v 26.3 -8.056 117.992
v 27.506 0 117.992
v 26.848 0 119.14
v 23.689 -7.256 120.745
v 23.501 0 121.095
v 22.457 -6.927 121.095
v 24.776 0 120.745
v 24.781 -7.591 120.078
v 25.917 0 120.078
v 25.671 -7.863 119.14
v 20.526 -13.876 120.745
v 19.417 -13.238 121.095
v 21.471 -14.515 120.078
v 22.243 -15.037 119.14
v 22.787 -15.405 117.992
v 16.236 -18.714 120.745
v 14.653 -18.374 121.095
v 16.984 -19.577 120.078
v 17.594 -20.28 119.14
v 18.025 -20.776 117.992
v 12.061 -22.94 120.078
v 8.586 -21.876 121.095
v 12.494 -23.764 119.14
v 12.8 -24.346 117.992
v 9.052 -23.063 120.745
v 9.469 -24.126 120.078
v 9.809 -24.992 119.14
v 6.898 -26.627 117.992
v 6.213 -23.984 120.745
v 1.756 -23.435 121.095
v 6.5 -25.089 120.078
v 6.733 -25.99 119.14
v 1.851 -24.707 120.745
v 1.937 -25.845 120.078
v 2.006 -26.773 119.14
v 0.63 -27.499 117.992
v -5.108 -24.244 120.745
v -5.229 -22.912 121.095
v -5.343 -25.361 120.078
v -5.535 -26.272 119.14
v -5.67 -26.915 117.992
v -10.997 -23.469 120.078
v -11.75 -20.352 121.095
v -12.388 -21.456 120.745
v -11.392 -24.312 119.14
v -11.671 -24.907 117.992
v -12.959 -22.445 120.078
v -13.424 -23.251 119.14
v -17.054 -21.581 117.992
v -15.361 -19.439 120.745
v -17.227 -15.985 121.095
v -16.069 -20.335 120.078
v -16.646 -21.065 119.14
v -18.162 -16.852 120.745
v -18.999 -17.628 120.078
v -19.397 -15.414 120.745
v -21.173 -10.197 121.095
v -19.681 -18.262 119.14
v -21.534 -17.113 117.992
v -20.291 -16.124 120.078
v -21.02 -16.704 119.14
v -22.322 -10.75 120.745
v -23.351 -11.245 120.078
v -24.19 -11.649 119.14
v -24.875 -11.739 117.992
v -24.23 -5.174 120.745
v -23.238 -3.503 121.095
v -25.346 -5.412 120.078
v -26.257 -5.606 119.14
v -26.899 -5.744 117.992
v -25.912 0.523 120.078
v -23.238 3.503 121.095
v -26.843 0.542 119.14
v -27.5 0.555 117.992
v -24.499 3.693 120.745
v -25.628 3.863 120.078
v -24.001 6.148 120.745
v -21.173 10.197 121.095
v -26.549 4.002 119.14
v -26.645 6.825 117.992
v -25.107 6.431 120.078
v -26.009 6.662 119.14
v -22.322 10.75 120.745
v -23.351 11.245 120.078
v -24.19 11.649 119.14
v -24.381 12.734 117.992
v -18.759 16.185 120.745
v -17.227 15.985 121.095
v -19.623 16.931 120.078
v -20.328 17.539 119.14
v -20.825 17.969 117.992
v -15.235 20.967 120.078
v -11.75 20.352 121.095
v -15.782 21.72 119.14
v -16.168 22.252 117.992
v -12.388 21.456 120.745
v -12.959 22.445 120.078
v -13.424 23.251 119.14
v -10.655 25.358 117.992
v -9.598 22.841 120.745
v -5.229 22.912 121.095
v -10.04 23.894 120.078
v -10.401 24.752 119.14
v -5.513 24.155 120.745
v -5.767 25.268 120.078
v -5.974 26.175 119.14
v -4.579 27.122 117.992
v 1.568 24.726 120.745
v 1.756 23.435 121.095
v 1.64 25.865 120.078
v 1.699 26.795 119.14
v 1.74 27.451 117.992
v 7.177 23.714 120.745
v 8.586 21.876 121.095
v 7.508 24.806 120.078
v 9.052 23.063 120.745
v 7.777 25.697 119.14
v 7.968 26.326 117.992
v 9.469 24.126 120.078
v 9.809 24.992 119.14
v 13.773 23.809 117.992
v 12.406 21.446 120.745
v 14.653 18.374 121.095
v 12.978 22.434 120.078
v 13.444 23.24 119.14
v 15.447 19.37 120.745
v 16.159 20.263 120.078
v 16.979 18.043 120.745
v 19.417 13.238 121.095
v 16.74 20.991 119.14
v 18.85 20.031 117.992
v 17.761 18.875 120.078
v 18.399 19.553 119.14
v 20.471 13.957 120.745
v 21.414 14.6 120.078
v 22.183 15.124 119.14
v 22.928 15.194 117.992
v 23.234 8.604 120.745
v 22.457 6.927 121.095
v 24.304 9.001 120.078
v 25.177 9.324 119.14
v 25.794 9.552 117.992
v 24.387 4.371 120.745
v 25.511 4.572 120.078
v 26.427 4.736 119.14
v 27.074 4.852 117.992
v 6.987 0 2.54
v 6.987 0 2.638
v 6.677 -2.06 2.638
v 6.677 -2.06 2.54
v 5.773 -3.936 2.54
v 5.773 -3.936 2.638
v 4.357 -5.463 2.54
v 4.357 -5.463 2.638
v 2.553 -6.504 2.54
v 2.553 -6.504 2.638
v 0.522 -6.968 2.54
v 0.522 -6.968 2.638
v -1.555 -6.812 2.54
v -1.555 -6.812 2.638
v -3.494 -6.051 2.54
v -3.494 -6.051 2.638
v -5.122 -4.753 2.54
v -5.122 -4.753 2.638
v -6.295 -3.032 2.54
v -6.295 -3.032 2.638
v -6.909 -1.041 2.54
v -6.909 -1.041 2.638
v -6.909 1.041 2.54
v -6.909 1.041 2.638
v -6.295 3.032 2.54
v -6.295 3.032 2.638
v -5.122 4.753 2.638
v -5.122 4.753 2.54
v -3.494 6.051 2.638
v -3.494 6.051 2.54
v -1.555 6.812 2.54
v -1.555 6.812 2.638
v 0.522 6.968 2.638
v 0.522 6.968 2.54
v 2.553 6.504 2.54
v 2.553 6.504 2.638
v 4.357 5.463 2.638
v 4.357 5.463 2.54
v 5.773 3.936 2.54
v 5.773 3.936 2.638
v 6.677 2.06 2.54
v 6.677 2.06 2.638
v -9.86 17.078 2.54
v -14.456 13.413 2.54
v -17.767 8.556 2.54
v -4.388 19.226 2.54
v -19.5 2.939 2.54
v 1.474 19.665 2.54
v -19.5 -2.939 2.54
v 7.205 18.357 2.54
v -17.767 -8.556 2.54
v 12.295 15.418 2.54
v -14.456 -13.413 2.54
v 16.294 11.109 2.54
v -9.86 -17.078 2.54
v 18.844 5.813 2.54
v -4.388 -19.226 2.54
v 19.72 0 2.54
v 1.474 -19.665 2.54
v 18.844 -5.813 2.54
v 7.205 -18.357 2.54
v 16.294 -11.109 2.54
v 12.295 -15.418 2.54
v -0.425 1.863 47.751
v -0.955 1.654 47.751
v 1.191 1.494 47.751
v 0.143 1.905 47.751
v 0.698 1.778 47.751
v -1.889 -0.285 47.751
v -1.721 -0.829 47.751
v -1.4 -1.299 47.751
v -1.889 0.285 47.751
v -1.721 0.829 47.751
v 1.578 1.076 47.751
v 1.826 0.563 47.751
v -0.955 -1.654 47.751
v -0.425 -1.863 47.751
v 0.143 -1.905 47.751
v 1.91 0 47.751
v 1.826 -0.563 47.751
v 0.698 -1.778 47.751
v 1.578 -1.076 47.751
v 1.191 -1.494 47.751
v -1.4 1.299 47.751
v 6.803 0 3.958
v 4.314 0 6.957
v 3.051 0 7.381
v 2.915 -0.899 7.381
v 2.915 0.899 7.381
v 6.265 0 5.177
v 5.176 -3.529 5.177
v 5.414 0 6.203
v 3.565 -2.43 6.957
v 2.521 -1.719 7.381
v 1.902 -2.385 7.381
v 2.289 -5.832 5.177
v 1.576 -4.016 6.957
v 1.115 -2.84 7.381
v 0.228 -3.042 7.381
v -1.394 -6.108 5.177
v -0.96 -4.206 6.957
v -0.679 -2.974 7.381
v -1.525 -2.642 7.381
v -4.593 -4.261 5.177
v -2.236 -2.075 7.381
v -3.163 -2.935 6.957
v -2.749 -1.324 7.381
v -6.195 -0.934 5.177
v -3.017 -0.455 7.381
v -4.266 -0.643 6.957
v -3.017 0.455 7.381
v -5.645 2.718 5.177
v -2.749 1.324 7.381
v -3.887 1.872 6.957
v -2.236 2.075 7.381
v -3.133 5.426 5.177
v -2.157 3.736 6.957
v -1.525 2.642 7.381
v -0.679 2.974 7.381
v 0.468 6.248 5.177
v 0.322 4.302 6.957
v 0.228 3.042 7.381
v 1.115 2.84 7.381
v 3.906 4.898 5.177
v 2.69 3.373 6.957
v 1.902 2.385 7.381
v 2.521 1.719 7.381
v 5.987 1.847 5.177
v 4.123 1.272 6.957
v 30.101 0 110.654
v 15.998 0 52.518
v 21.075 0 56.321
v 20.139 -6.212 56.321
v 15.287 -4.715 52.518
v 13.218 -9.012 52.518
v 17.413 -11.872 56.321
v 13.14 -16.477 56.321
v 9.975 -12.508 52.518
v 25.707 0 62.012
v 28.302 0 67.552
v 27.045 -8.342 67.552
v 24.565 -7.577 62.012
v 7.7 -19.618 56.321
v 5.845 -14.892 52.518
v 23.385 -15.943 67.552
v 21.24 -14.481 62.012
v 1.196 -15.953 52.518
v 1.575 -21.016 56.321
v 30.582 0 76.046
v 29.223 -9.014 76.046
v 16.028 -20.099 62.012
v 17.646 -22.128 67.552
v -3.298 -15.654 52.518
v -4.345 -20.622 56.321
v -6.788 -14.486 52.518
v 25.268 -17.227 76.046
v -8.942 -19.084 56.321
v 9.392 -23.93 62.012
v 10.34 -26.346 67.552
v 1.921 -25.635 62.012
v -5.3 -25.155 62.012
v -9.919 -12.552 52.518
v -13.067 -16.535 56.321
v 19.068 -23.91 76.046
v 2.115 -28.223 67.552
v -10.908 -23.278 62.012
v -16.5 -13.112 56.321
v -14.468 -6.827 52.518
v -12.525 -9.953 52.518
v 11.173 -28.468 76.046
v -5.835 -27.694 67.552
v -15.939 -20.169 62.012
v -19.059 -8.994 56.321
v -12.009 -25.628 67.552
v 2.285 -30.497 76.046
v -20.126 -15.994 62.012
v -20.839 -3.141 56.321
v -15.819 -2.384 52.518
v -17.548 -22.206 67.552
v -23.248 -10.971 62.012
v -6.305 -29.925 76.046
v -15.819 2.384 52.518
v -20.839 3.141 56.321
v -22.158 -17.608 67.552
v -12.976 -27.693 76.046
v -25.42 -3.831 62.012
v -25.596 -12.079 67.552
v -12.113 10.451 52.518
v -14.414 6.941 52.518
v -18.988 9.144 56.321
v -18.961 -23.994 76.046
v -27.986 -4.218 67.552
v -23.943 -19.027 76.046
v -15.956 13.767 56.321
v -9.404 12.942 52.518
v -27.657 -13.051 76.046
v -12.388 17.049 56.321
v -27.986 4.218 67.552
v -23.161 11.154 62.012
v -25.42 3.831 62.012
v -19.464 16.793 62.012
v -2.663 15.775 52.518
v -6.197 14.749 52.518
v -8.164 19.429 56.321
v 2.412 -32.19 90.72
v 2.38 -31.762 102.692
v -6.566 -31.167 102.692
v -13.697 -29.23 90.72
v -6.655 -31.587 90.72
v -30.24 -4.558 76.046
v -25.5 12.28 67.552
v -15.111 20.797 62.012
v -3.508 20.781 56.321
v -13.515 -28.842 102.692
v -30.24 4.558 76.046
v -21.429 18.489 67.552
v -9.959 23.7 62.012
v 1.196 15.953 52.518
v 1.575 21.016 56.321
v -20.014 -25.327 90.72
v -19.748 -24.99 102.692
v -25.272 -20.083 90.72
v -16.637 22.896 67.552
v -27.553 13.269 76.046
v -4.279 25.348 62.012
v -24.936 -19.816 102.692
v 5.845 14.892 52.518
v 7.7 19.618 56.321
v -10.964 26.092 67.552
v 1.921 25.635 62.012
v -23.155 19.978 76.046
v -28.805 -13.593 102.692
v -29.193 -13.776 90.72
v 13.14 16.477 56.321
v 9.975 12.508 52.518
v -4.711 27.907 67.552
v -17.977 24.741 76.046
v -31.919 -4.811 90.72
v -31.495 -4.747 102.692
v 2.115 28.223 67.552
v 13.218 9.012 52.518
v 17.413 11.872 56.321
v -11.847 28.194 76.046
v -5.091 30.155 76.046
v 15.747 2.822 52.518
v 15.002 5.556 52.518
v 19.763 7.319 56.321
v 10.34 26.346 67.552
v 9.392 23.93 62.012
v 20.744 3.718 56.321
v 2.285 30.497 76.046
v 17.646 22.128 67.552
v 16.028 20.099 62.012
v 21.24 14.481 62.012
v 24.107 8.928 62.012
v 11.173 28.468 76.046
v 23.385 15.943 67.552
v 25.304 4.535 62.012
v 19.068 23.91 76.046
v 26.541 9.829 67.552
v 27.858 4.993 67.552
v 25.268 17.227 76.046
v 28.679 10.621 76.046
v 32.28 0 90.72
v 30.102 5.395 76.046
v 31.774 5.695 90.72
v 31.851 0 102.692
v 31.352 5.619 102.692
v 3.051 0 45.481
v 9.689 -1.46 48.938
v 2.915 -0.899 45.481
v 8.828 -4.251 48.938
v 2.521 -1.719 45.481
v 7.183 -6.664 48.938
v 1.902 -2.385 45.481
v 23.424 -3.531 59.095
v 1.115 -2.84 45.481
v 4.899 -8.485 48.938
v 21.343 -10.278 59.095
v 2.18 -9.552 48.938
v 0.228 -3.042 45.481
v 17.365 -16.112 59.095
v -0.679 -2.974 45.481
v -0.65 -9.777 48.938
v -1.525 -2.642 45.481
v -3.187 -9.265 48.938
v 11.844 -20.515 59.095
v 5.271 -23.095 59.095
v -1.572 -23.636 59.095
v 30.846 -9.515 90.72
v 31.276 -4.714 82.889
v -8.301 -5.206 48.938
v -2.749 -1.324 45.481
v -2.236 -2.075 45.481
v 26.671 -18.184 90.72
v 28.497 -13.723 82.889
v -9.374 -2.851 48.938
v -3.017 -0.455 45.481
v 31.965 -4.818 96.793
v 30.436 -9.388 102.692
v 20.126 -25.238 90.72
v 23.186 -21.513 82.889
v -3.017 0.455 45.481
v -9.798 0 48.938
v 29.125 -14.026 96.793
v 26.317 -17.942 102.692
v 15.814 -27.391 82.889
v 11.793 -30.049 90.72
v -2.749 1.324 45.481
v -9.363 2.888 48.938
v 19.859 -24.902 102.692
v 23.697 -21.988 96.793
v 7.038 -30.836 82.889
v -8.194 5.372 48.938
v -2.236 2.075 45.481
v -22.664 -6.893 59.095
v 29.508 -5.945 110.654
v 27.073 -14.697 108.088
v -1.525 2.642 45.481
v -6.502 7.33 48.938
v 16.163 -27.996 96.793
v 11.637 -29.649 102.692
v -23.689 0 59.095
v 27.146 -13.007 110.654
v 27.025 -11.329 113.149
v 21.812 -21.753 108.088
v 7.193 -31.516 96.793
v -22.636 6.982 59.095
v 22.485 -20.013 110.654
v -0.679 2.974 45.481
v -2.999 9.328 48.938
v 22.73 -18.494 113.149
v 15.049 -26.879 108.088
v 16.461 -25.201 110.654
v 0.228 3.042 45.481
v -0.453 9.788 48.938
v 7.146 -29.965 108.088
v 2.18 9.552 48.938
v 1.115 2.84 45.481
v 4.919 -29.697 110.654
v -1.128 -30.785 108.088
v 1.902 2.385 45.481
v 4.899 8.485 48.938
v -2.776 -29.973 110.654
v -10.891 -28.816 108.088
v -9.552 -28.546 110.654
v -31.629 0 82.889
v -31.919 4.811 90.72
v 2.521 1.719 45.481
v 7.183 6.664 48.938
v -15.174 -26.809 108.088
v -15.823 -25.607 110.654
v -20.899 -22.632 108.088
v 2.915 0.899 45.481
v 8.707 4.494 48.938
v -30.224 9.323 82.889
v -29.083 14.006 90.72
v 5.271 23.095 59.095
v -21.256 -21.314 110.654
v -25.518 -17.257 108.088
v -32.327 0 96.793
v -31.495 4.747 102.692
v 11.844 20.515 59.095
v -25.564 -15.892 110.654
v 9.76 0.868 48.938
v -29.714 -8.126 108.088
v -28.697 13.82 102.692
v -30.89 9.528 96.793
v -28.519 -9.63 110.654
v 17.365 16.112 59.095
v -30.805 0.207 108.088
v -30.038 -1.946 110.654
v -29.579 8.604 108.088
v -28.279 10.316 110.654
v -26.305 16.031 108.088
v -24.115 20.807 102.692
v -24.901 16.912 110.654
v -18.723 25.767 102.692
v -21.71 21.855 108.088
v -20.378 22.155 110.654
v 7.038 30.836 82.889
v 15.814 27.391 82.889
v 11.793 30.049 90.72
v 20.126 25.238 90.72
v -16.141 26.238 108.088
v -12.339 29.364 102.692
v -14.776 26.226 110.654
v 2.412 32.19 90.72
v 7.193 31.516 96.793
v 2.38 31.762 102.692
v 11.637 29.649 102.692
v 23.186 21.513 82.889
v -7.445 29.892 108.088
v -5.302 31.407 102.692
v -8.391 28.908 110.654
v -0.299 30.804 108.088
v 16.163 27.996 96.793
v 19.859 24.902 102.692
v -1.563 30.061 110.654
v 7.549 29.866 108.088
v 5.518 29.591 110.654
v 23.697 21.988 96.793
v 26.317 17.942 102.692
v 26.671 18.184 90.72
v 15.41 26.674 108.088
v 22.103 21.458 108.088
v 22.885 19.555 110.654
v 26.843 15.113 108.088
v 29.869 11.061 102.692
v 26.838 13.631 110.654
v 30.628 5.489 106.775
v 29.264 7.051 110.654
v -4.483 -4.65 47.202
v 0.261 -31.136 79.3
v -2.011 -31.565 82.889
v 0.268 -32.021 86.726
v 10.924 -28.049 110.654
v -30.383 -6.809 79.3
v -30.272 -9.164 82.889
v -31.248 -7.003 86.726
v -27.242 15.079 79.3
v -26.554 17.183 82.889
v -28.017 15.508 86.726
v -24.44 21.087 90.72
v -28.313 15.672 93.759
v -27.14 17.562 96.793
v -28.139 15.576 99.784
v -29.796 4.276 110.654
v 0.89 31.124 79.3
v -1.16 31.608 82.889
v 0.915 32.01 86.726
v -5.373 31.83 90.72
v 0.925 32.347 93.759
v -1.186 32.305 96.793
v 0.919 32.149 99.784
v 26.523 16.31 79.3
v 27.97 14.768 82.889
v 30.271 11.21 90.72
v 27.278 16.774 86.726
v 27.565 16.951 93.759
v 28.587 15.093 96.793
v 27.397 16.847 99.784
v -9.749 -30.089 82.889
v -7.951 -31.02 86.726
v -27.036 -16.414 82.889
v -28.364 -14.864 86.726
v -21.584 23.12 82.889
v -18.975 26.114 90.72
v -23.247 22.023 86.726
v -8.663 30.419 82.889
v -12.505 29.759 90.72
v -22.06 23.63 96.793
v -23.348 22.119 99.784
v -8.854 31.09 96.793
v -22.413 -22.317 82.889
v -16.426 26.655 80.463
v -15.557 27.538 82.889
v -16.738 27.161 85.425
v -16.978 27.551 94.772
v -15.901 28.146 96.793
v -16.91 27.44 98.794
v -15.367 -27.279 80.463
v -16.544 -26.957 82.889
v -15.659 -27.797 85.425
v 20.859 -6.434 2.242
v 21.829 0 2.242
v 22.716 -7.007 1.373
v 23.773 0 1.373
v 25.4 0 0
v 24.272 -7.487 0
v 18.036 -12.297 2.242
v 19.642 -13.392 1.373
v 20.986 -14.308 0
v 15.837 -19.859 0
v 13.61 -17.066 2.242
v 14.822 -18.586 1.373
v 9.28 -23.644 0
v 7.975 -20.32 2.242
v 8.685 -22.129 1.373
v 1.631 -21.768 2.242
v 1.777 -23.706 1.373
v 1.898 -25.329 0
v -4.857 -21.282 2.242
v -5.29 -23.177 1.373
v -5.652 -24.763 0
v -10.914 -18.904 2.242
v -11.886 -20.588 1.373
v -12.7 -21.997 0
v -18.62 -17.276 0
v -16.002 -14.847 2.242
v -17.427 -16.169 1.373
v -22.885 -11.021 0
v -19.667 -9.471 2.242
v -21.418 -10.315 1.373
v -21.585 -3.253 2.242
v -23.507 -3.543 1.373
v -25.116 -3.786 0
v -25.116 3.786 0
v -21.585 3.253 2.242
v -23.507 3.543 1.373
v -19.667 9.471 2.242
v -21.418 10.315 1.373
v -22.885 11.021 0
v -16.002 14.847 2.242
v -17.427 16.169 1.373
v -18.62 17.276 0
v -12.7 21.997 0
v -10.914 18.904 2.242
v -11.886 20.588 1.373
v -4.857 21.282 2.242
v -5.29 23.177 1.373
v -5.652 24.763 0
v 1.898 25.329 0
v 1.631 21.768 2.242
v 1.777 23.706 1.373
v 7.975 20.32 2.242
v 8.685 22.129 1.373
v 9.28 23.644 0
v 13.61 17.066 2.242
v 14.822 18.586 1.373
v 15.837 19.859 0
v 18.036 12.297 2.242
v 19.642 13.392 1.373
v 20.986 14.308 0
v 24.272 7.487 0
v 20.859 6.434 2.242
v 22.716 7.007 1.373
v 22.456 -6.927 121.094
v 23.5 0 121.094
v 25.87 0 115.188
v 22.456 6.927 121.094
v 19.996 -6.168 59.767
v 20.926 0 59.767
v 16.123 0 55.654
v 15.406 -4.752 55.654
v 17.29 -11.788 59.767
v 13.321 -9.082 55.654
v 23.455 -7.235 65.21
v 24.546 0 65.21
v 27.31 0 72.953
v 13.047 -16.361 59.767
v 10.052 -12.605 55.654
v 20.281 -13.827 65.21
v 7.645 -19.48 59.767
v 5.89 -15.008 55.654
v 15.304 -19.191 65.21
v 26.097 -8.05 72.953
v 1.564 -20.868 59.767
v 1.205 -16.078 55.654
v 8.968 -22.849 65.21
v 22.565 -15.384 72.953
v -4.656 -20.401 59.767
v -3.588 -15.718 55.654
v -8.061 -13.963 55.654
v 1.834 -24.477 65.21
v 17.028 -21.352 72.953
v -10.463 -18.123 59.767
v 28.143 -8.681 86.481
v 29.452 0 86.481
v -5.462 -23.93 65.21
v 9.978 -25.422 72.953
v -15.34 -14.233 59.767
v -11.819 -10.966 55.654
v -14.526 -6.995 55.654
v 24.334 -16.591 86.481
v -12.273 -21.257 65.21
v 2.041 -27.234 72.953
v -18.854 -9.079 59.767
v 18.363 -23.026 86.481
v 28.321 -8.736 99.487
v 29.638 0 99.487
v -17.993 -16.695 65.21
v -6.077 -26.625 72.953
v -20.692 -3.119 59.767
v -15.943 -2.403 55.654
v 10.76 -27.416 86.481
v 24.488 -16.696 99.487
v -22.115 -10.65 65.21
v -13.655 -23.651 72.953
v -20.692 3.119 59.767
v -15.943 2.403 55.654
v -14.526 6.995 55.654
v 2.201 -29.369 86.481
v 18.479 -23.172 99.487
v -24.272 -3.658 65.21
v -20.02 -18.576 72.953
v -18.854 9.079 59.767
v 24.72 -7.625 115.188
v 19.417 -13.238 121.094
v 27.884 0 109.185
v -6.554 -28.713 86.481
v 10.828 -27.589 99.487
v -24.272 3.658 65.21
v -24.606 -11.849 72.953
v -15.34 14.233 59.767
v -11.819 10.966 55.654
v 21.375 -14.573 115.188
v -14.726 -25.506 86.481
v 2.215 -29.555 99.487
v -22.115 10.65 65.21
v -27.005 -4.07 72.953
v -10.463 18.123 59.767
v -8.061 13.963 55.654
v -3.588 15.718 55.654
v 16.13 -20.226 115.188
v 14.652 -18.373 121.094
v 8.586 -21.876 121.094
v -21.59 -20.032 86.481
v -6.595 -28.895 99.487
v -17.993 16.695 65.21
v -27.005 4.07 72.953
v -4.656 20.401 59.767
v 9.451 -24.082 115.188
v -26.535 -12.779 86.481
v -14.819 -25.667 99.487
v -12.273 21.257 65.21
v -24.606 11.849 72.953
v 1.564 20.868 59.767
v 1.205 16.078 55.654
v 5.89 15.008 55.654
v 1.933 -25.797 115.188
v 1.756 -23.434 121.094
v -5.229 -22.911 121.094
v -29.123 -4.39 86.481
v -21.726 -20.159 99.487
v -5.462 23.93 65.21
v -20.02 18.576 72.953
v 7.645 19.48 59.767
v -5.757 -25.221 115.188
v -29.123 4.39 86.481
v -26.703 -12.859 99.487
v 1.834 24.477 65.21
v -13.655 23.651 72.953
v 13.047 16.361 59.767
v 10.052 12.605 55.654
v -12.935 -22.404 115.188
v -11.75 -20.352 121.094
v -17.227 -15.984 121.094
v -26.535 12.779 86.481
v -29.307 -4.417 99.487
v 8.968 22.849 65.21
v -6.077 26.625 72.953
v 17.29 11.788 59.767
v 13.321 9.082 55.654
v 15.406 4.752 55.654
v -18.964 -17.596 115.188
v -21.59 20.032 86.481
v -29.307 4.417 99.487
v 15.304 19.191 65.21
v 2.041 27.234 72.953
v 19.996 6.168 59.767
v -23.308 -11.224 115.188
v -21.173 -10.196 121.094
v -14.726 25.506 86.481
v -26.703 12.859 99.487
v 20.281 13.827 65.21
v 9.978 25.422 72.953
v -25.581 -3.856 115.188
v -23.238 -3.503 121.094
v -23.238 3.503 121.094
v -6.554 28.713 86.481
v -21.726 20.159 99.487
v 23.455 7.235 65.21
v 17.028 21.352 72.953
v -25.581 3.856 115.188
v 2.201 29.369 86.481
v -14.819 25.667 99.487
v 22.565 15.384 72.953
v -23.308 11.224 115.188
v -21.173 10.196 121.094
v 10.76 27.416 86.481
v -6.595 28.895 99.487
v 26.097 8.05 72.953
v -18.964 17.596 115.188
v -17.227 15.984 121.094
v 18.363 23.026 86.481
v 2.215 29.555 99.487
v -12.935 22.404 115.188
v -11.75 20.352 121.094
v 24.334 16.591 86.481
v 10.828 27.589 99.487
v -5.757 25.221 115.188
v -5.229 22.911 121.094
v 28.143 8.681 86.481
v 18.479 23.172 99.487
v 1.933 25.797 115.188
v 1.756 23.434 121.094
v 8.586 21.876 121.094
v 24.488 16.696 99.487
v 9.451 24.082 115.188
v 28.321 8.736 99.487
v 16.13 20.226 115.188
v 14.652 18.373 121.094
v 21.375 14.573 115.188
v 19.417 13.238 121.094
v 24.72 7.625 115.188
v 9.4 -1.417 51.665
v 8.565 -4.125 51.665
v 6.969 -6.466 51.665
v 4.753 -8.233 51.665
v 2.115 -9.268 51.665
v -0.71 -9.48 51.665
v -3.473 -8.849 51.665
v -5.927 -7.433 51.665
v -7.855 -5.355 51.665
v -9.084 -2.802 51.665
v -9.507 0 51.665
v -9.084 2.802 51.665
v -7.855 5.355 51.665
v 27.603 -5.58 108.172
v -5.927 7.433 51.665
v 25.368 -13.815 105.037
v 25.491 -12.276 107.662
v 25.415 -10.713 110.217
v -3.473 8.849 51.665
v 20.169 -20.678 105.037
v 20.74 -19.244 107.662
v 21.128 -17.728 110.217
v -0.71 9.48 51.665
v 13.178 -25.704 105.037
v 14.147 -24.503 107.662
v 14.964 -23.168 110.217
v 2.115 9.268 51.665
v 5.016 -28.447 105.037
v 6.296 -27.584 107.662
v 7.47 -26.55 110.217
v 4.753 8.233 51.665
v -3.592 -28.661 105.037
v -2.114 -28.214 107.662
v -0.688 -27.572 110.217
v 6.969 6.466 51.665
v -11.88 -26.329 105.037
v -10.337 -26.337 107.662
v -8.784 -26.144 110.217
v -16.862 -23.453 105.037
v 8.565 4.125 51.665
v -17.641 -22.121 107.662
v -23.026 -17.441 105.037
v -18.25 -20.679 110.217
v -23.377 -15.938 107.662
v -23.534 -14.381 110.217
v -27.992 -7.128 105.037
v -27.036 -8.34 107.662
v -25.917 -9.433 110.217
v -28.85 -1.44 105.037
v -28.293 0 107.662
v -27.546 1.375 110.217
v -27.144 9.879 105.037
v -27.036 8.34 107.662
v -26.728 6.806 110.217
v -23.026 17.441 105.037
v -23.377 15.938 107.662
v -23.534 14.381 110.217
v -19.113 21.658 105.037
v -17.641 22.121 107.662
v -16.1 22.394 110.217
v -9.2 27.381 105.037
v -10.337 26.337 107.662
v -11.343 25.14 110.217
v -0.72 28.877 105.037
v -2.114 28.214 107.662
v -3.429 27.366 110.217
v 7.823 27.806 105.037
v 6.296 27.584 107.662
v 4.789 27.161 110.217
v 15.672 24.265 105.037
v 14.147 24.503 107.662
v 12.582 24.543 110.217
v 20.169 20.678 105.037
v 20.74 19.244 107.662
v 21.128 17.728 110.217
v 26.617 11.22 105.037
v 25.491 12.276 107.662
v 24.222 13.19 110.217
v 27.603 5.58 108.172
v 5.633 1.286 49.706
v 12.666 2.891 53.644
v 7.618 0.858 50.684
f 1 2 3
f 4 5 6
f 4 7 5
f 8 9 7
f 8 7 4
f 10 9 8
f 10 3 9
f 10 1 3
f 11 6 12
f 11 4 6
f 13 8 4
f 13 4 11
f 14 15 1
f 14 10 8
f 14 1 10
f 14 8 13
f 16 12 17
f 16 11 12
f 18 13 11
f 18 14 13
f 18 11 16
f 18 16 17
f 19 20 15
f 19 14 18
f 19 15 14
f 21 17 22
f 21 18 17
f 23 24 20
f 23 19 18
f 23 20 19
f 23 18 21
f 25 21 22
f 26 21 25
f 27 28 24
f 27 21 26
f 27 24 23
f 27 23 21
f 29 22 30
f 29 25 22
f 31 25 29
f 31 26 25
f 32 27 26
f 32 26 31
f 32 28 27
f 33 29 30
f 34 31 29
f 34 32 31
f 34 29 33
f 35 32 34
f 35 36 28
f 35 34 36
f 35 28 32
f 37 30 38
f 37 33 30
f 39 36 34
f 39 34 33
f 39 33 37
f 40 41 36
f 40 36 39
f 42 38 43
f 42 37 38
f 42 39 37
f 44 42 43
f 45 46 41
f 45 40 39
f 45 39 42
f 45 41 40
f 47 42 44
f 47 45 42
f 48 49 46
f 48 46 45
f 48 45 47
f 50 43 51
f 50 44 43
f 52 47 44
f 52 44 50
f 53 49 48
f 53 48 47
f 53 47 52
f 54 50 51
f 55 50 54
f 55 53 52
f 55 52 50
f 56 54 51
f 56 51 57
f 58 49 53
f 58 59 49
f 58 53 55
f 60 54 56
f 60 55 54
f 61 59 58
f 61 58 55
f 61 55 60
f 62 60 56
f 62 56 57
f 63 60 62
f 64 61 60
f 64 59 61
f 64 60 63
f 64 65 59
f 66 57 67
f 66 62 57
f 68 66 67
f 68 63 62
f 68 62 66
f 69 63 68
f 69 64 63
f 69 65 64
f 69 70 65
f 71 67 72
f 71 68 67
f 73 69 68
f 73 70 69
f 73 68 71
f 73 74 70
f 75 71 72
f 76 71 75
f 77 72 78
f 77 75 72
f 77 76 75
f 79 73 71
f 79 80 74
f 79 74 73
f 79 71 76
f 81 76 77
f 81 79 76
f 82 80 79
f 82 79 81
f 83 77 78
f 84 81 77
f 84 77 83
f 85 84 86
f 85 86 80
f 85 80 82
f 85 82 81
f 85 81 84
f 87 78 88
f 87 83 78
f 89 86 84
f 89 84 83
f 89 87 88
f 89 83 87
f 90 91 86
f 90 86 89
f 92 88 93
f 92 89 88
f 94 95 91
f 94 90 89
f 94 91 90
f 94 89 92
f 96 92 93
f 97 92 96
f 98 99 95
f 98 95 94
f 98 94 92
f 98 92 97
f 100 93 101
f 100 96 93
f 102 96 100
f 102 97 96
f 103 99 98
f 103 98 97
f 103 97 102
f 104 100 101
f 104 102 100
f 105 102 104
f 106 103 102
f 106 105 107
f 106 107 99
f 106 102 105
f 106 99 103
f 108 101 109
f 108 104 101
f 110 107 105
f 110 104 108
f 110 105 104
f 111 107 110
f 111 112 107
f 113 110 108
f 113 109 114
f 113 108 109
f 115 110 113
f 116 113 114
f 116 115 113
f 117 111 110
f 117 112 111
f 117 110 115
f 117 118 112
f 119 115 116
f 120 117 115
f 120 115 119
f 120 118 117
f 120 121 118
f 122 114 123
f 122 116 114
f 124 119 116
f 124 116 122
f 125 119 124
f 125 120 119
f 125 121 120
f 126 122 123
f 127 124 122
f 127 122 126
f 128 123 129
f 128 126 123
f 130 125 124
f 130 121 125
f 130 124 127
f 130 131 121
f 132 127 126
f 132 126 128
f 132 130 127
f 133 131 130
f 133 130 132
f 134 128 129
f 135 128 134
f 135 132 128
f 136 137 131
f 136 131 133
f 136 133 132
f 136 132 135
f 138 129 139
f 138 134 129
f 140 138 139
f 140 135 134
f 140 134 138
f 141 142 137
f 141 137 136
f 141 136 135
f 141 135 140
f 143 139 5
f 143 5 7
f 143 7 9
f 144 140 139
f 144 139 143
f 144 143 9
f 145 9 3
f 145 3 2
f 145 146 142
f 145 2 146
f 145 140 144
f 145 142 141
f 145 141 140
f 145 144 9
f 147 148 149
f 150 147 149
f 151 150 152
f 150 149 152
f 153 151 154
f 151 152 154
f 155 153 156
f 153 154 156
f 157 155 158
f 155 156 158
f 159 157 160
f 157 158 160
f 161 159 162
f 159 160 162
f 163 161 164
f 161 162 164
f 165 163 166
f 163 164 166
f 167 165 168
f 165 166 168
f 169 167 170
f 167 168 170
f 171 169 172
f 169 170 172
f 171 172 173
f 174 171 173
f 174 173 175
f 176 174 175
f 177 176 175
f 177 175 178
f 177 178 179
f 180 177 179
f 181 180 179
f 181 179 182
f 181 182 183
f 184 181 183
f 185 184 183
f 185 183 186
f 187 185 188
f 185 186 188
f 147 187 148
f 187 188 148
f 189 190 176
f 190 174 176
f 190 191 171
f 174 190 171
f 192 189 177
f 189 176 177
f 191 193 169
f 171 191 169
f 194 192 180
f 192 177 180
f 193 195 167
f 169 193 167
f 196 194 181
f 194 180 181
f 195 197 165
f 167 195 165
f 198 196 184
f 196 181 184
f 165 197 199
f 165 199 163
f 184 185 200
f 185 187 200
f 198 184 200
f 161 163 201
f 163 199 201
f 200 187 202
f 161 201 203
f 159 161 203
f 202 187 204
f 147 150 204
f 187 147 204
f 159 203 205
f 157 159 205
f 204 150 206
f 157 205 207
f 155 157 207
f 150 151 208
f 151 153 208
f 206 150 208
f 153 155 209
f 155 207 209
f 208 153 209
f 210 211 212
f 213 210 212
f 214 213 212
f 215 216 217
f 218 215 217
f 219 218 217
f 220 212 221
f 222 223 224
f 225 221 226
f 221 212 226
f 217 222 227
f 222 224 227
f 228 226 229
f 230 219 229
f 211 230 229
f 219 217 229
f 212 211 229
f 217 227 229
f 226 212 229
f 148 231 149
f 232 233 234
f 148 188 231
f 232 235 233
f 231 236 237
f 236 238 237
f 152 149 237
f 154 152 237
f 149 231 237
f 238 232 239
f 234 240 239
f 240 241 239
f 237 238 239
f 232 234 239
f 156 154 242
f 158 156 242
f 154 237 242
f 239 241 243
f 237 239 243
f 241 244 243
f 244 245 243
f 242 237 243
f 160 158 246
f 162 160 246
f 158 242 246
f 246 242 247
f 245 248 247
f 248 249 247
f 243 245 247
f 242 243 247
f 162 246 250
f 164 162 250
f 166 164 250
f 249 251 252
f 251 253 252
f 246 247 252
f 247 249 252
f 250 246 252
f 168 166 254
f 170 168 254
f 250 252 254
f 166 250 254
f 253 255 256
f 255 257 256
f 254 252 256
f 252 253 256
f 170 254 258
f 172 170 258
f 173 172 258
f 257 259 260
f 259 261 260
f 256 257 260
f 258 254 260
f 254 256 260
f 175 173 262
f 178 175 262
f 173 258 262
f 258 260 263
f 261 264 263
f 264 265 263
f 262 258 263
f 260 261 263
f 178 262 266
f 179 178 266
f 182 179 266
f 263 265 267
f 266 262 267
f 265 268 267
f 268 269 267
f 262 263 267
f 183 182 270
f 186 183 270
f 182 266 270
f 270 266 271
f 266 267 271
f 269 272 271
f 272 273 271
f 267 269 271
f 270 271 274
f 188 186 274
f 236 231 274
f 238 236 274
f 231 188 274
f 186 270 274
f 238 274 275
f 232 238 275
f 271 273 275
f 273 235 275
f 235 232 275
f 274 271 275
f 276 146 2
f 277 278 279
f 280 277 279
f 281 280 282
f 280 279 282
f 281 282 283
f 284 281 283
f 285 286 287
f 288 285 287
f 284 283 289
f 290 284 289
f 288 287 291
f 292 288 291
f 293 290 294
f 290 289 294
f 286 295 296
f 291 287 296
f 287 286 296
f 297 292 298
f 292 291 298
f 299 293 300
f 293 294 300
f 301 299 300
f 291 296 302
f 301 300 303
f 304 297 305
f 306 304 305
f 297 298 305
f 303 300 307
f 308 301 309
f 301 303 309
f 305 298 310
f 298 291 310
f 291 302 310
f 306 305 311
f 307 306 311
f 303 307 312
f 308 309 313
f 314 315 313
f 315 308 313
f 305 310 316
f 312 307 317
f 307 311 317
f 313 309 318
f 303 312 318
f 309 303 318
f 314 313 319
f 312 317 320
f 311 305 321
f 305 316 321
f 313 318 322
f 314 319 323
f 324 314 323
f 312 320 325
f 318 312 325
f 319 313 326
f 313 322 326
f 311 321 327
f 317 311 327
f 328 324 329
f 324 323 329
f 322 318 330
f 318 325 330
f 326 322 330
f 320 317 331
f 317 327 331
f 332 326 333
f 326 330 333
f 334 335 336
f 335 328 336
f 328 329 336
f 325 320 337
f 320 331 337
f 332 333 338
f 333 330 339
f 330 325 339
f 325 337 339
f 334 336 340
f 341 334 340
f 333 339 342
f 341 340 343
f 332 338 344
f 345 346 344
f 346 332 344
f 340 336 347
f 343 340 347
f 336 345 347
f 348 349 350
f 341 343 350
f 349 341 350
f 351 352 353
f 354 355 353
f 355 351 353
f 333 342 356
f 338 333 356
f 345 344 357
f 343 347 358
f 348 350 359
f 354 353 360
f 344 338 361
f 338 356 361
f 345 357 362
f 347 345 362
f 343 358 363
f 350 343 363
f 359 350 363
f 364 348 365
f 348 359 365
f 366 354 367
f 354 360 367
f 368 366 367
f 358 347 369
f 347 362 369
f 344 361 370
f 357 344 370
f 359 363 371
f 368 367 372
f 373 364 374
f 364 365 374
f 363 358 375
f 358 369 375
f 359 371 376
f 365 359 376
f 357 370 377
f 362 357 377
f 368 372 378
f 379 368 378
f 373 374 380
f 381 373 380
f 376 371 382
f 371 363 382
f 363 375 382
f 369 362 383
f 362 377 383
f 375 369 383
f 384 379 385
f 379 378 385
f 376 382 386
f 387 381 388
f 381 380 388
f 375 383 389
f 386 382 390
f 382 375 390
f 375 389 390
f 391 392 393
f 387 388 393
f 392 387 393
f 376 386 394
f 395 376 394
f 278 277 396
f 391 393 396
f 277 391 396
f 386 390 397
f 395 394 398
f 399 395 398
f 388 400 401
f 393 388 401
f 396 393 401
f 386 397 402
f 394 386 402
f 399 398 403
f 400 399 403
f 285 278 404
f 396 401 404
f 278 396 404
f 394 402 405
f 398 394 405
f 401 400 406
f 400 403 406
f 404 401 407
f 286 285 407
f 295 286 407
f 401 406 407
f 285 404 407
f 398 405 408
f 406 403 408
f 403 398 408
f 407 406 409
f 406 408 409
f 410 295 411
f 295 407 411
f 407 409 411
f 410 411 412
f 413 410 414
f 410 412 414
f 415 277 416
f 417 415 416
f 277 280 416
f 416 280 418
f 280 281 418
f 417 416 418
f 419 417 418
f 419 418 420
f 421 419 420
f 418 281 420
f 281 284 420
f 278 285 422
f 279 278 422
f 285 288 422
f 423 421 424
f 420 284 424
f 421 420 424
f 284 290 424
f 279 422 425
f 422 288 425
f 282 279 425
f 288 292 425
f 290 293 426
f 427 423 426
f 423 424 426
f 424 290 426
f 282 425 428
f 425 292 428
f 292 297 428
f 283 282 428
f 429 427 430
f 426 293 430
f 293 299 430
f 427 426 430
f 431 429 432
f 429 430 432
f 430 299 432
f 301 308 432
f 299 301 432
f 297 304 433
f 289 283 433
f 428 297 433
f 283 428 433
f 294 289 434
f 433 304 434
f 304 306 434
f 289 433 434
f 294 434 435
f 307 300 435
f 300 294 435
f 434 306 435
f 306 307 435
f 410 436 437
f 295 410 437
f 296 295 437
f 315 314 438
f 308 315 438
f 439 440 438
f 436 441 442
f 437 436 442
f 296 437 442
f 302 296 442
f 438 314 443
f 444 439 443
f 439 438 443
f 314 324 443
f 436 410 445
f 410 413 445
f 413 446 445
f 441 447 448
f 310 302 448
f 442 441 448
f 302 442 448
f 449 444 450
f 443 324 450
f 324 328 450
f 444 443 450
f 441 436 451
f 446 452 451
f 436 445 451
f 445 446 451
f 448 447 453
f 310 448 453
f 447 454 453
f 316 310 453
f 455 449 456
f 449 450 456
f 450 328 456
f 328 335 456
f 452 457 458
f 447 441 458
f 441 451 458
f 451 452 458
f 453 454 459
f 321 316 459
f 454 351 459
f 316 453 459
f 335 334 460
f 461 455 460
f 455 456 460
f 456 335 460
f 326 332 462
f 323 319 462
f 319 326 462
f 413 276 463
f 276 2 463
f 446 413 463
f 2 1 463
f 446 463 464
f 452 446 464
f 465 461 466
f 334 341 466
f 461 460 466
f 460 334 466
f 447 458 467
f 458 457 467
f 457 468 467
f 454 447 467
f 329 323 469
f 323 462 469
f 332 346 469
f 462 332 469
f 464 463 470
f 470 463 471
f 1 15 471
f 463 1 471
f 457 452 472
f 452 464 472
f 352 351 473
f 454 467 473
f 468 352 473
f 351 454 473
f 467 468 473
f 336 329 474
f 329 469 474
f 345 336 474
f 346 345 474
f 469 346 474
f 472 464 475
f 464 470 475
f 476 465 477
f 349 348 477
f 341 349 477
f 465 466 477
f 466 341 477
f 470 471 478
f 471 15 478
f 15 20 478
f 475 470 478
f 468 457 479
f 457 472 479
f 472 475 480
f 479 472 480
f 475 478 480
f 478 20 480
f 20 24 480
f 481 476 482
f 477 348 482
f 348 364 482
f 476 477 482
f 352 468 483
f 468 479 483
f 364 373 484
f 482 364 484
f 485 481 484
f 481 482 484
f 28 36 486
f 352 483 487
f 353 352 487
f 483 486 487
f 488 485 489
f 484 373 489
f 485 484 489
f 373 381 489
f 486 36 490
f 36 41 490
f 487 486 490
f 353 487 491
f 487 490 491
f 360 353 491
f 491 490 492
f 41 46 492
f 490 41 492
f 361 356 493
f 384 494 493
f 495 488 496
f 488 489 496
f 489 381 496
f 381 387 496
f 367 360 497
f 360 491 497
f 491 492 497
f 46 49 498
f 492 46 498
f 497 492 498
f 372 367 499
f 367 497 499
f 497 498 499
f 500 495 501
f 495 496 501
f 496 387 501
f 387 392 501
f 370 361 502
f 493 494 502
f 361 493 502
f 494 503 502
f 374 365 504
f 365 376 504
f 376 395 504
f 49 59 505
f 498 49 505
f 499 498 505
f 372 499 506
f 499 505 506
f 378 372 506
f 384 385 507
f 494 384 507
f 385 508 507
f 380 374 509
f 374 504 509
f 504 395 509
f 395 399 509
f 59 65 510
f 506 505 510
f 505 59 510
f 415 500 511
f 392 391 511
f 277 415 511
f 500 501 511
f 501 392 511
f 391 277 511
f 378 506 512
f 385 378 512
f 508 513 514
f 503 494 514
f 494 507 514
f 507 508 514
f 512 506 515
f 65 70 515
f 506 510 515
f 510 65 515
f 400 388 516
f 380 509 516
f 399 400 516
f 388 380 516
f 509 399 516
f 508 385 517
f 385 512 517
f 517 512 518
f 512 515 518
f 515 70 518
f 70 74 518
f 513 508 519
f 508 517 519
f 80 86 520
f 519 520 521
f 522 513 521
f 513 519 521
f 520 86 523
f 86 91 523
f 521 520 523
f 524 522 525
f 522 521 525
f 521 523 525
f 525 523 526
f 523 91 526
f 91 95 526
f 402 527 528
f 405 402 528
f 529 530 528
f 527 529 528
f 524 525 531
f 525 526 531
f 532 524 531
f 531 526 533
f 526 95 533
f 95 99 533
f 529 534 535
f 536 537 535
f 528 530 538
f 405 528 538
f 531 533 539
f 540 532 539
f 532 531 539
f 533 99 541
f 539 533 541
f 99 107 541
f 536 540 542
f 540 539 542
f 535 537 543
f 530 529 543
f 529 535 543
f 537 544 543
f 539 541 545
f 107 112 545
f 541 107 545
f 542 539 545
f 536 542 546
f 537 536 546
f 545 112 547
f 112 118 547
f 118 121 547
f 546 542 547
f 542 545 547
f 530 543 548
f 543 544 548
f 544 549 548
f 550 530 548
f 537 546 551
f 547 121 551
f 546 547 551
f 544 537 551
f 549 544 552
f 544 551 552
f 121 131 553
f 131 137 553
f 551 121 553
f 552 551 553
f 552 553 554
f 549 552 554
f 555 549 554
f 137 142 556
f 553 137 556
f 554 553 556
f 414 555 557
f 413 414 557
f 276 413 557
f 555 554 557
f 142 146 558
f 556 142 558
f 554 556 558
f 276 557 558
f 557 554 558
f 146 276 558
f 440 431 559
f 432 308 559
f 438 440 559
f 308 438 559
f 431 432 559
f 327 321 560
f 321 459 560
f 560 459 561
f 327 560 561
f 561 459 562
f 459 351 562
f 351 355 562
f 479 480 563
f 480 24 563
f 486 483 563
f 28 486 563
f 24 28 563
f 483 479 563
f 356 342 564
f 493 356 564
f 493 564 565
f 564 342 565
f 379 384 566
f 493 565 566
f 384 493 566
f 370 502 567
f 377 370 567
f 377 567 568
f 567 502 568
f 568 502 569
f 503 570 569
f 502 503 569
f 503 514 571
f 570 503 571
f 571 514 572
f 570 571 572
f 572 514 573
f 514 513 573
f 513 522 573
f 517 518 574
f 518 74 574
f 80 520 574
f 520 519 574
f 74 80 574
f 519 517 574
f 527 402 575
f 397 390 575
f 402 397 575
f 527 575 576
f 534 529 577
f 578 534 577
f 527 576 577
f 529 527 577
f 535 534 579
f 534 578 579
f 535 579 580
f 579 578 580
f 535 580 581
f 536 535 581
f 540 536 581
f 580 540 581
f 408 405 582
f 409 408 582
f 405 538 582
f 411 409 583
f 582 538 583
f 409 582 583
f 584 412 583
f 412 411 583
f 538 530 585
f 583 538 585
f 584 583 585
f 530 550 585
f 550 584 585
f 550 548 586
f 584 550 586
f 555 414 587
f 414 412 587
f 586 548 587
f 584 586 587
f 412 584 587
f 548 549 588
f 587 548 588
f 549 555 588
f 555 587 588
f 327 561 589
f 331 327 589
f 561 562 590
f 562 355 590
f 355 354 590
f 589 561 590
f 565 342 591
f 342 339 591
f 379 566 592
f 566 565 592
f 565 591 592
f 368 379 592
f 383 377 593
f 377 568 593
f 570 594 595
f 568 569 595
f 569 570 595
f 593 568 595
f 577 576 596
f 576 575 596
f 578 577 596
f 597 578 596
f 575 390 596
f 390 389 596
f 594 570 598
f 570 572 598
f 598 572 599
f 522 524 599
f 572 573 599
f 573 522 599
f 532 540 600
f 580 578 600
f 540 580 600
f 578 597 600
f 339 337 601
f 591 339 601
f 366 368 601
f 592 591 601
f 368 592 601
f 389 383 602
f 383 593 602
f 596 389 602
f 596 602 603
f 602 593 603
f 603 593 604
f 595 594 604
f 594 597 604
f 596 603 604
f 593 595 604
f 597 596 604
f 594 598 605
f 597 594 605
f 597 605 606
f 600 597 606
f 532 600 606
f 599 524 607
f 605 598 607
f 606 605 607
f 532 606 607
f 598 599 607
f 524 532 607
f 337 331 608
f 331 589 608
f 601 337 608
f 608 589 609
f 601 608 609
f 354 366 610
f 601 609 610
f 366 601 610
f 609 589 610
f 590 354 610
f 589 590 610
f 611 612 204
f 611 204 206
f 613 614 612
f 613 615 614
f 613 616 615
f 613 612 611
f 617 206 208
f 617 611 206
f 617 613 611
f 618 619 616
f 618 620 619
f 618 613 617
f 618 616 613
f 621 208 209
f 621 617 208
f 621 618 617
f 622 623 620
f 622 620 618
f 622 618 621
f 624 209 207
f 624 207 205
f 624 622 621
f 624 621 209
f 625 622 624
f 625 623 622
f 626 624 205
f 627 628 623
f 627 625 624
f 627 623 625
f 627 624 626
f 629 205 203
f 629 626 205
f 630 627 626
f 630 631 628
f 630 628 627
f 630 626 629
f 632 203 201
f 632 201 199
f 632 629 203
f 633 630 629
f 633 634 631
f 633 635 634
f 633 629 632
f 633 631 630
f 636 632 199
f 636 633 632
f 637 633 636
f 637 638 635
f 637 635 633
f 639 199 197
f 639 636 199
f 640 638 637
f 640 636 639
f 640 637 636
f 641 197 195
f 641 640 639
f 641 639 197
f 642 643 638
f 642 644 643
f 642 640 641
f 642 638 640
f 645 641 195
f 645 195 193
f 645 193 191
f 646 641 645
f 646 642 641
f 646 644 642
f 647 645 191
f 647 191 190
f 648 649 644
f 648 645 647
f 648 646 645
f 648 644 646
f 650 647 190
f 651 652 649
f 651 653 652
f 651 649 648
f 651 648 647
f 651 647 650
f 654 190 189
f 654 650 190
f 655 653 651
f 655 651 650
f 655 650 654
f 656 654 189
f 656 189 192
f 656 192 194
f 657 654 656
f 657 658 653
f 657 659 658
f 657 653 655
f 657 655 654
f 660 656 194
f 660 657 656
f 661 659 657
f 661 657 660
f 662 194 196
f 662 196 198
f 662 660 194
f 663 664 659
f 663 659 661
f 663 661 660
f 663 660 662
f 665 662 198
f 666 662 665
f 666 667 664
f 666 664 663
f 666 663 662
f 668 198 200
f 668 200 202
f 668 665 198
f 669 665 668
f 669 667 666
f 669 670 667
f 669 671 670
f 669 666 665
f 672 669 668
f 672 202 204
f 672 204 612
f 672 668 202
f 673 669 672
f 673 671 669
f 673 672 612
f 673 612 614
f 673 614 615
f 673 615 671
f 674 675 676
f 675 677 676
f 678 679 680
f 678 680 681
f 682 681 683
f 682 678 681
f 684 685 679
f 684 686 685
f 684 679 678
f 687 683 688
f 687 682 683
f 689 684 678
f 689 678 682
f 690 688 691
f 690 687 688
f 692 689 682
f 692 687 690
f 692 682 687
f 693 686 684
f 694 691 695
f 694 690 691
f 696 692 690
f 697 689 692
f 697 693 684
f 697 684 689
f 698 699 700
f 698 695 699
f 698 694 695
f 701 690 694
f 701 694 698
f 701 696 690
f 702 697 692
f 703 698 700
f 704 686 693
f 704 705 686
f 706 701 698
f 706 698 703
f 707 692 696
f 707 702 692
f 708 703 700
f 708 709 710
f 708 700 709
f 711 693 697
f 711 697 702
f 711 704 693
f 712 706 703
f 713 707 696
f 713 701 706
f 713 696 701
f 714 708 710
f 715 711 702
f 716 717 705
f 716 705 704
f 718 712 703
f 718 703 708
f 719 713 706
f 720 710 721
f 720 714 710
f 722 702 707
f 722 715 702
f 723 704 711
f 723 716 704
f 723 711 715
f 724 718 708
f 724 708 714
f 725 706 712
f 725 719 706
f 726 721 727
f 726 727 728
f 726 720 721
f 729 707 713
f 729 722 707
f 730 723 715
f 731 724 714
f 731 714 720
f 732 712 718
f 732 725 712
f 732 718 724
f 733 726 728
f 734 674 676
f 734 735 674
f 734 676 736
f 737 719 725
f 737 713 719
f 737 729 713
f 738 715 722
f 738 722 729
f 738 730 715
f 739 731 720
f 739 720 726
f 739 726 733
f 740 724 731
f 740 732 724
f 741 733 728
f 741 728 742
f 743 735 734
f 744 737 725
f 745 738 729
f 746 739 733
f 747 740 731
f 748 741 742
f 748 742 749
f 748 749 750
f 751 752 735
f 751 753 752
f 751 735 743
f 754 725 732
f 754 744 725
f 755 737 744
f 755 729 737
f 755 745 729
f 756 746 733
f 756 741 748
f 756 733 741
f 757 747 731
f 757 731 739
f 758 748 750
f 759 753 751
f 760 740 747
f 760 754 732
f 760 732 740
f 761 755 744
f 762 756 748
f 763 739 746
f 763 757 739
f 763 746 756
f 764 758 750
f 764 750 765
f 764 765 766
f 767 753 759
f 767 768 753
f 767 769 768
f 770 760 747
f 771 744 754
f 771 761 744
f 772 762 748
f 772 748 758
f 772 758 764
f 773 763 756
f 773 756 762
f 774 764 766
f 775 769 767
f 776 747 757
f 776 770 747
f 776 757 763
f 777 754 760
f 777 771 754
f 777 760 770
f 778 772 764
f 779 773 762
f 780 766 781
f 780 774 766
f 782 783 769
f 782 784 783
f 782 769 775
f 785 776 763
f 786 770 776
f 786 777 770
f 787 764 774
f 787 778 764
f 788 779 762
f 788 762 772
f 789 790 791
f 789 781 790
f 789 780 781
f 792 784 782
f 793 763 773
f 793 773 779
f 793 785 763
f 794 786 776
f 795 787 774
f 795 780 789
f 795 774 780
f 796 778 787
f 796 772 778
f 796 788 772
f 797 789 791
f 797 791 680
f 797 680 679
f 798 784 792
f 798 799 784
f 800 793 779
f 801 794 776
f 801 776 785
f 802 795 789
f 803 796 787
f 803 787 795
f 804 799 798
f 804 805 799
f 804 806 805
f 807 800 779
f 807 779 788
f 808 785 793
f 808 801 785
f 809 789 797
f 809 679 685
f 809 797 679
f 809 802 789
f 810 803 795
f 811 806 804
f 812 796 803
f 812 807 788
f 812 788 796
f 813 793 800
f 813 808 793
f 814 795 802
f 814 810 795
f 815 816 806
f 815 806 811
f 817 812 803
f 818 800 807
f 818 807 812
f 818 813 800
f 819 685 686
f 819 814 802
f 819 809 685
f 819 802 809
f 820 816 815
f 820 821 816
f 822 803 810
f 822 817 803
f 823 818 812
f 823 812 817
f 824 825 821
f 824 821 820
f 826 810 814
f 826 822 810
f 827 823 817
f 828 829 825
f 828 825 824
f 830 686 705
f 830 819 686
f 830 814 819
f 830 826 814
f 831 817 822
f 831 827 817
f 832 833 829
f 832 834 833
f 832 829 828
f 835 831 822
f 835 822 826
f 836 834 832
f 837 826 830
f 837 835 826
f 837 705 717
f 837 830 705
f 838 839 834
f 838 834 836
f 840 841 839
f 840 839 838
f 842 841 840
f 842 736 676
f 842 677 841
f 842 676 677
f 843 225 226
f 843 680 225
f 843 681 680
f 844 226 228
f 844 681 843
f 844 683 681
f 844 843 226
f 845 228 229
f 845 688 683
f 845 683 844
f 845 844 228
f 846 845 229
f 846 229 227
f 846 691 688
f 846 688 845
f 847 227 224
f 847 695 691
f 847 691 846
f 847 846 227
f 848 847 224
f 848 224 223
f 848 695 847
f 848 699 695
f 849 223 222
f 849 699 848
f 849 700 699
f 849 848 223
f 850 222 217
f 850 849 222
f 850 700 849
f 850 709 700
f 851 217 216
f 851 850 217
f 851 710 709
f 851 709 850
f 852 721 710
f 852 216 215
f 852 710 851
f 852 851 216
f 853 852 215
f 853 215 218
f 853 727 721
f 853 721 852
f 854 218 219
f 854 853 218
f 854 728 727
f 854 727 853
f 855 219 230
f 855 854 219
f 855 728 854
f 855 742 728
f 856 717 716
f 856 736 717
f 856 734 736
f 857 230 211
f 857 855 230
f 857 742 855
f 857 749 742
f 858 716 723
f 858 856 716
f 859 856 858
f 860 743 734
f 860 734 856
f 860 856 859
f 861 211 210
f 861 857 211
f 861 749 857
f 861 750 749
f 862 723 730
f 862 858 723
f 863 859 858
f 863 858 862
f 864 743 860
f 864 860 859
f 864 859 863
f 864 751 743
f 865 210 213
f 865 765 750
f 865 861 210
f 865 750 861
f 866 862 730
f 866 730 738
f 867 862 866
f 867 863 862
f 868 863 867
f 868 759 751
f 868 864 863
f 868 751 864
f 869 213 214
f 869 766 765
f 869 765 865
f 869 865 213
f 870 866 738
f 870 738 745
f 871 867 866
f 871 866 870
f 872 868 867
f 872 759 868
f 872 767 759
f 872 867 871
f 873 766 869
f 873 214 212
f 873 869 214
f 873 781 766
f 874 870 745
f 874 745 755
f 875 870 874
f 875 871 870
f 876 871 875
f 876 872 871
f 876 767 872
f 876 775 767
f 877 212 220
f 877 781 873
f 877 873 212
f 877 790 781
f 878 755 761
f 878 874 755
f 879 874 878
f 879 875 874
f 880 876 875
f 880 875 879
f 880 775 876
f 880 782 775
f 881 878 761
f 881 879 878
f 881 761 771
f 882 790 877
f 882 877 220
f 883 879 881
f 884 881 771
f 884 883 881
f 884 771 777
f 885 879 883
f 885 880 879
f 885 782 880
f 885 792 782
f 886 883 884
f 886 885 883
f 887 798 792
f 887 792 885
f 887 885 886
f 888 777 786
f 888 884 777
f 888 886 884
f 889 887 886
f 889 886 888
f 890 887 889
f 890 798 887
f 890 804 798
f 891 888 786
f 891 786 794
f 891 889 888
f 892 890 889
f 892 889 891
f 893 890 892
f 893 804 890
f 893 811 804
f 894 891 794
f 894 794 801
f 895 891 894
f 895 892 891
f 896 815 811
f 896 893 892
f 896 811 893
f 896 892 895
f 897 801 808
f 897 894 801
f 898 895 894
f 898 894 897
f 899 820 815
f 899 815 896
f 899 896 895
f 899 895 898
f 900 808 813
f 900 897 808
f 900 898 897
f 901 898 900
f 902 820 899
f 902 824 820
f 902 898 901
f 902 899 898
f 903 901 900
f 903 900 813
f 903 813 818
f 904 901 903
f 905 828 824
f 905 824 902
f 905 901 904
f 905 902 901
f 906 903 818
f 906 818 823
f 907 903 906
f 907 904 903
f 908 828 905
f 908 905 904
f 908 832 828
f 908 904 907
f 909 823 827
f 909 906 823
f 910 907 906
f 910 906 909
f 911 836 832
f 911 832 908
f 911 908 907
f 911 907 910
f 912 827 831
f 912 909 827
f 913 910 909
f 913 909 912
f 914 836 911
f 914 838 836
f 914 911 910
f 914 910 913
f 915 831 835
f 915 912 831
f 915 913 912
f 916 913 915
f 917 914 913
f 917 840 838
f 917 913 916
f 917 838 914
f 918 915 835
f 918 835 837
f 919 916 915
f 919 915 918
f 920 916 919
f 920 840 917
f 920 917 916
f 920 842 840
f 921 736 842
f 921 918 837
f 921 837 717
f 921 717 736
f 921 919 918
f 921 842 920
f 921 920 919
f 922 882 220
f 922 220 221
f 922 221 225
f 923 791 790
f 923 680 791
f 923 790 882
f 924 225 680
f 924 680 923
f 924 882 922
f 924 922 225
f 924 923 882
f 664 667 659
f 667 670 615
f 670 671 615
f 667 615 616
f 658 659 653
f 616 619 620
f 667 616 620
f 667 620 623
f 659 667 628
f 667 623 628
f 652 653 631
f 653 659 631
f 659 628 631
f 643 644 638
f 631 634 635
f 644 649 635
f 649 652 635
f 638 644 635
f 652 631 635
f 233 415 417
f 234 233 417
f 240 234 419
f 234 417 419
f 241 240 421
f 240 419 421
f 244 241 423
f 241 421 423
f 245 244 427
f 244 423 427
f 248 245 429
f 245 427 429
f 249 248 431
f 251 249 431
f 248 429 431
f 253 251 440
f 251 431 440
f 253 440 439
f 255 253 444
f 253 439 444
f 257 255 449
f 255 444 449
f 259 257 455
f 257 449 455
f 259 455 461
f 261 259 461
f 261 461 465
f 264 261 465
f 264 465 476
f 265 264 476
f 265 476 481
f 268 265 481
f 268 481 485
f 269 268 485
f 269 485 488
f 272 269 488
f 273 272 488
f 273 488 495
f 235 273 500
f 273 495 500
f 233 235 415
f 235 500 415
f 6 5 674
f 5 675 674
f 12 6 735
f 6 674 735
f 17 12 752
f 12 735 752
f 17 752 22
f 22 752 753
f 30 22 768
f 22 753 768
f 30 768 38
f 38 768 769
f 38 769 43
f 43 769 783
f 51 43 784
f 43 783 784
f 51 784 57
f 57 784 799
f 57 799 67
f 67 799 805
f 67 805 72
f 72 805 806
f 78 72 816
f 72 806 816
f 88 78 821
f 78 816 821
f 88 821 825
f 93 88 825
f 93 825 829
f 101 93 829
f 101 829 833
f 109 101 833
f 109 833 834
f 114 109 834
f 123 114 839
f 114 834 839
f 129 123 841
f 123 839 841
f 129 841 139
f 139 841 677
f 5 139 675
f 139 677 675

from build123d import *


# Not quite as in the source:
# - a fillet or chamfer that OpenCascade refuses, or shapes differently, is made with other operations: its cross-section is extruded or revolved along the edge and cut away or added
# - the dataset's text gives a spline's control points without its knots; the knots are read off the source's solid


with BuildPart() as f1:
    # F0 (on Front) → F1 (revolve)
    with BuildSketch(Plane.XZ):
        with BuildLine():
            Line((0, 47.7505947651), (0, 0))
            Line((0, 0), (25.4, 0))
            Line((25.4, 0), (25.4, 2.54))
            Line((25.4, 2.54), (6.9873421453, 2.54))
            Line((6.9873421453, 2.54), (6.9873421453, 7.3809963651))
            Line((6.9873421453, 7.3809963651), (3.0508127529, 7.3809963651))
            Line((3.0508127529, 7.3809963651), (3.0508127529, 45.4809963651))
            add(Edge.make_bspline(
                [(3.0508127529, 45.4809963651), (9.8461281639, 48.8954375707), (21.7228349186, 54.8631247901), (28.2240876429, 65.9165943611), (31.5127213678, 78.4358206865), (33.6784171743, 103.0849392109), (28.386283274, 115.9113566716), (25.8480589837, 122.0631897449)],
                knots=[0, 0, 0, 0, 0.2177295257, 0.3805430023, 0.5507700364, 0.7845393886, 1, 1, 1, 1], degree=3))
            Line((25.8480589837, 122.0631897449), (23.5000647508, 121.0944157349))
            add(Edge.make_bspline(
                [(1.9104079551, 47.7505947651), (3.8610263285, 48.7307217125), (7.7368881371, 50.6784180709), (12.2259767295, 53.1394673421), (15.4202565252, 55.1450698166), (17.2113496311, 56.4137046376), (18.4985579441, 57.4361542965), (19.3831690783, 58.2033768453), (20.1915430594, 58.9776879327), (21.1841928439, 60.0273218326), (22.2759624919, 61.3698248404), (23.392344712, 63.0381272524), (24.353200167, 64.7712061983), (25.0530786649, 66.2746693843), (25.5687607147, 67.5124472772), (26.0517126553, 68.761934225), (26.8207352465, 71.0094584469), (27.5553728133, 73.8128228874), (28.1157522153, 76.6310441845), (28.4178367466, 78.3658990039), (28.7101517328, 80.190879424), (29.0504794951, 82.6183883543), (29.5115503692, 86.7396383327), (29.8033217447, 91.1030083431), (29.8407350232, 95.4791342687), (29.7215088128, 98.7091824899), (29.4842699418, 101.3065910758), (29.202697145, 103.2994868111), (28.8607016819, 105.2540587373), (28.3291470633, 107.6283352293), (27.2887198112, 111.3164298649), (25.6928207945, 115.7785494719), (24.236343262, 119.3099152425), (23.5000647508, 121.0944157349)],
                knots=[4e-10, 4e-10, 4e-10, 4e-10, 0.0625000004, 0.1250000003, 0.1562500003, 0.1875000003, 0.2031250003, 0.2187500003, 0.2343750003, 0.2500000003, 0.2812500003, 0.3125000003, 0.3437500003, 0.3750000002, 0.3906250002, 0.4062500002, 0.4375000002, 0.5000000002, 0.5312500002, 0.5468750002, 0.5625000002, 0.5937500002, 0.6250000001, 0.6875000001, 0.7187500001, 0.7500000001, 0.7812500001, 0.7968750001, 0.8125000001, 0.8437500001, 0.875, 0.9375, 1, 1, 1, 1], degree=3))
            Line((1.9104079551, 47.7505947651), (0, 47.7505947651))
        make_face()
    revolve(axis=Axis((0, 0, 23.8752973825), (0, 0, -1)))

    # F2: fillet of radius 4.826 on 1 edges, made by hand

    # F2_s1 → F2_t2 (revolve, cut)
    with BuildSketch(Plane.XZ):
        with BuildLine():
            ThreePointArc((6.9873421453, 2.6376728427), (5.8750236847, 5.7196925415), (3.0508127529, 7.3809963651))
            Line((3.0508127529, 7.3809963651), (6.9873421453, 7.3809963651))
            Line((6.9873421453, 7.3809963651), (6.9873421453, 2.6376728427))
        make_face()
    revolve(axis=Axis((0, 0, 7.3809963651), (0, 0, -1)), mode=Mode.SUBTRACT)

    # F3: fillet of radius 7.62 on 1 edges, made by hand

    # F3_s1 → F3_t2 (revolve, cut)
    with BuildSketch(Plane.XZ):
        with BuildLine():
            ThreePointArc((19.7203873372, 2.54), (22.8312393105, 1.8760764803), (25.4, 0))
            Line((25.4, 0), (25.4, 2.54))
            Line((25.4, 2.54), (19.7203873372, 2.54))
        make_face()
    revolve(axis=Axis((0, 0, 2.54), (0, 0, -1)), mode=Mode.SUBTRACT)

    # F4: fillet of radius 5.08 on 1 edges, made by hand

    # F4_s1 → F4_t2 (revolve, cut)
    with BuildSketch(Plane.XZ):
        with BuildLine():
            ThreePointArc((23.5001194129, 121.0948119824), (25.9427148586, 120.0585616678), (27.5299870338, 117.93237864))
            Line((27.5299870338, 117.93237864), (28.0024132618, 118.1195048845))
            ThreePointArc((28.0024132618, 118.1195048845), (27.1665806291, 120.1928354079), (26.3177840752, 122.2569966352))
            Line((26.3177840752, 122.2569966352), (25.6542520935, 122.5329148365))
            ThreePointArc((25.6542520935, 122.5329148365), (24.4803481858, 122.048566289), (23.5695588788, 121.5981815612))
            Line((23.5695588788, 121.5981815612), (23.5001194129, 121.0948119824))
        make_face()
    revolve(axis=Axis((0, 0, 122.0631897449), (0, 0, -1)), mode=Mode.SUBTRACT)


solid = f1.part
